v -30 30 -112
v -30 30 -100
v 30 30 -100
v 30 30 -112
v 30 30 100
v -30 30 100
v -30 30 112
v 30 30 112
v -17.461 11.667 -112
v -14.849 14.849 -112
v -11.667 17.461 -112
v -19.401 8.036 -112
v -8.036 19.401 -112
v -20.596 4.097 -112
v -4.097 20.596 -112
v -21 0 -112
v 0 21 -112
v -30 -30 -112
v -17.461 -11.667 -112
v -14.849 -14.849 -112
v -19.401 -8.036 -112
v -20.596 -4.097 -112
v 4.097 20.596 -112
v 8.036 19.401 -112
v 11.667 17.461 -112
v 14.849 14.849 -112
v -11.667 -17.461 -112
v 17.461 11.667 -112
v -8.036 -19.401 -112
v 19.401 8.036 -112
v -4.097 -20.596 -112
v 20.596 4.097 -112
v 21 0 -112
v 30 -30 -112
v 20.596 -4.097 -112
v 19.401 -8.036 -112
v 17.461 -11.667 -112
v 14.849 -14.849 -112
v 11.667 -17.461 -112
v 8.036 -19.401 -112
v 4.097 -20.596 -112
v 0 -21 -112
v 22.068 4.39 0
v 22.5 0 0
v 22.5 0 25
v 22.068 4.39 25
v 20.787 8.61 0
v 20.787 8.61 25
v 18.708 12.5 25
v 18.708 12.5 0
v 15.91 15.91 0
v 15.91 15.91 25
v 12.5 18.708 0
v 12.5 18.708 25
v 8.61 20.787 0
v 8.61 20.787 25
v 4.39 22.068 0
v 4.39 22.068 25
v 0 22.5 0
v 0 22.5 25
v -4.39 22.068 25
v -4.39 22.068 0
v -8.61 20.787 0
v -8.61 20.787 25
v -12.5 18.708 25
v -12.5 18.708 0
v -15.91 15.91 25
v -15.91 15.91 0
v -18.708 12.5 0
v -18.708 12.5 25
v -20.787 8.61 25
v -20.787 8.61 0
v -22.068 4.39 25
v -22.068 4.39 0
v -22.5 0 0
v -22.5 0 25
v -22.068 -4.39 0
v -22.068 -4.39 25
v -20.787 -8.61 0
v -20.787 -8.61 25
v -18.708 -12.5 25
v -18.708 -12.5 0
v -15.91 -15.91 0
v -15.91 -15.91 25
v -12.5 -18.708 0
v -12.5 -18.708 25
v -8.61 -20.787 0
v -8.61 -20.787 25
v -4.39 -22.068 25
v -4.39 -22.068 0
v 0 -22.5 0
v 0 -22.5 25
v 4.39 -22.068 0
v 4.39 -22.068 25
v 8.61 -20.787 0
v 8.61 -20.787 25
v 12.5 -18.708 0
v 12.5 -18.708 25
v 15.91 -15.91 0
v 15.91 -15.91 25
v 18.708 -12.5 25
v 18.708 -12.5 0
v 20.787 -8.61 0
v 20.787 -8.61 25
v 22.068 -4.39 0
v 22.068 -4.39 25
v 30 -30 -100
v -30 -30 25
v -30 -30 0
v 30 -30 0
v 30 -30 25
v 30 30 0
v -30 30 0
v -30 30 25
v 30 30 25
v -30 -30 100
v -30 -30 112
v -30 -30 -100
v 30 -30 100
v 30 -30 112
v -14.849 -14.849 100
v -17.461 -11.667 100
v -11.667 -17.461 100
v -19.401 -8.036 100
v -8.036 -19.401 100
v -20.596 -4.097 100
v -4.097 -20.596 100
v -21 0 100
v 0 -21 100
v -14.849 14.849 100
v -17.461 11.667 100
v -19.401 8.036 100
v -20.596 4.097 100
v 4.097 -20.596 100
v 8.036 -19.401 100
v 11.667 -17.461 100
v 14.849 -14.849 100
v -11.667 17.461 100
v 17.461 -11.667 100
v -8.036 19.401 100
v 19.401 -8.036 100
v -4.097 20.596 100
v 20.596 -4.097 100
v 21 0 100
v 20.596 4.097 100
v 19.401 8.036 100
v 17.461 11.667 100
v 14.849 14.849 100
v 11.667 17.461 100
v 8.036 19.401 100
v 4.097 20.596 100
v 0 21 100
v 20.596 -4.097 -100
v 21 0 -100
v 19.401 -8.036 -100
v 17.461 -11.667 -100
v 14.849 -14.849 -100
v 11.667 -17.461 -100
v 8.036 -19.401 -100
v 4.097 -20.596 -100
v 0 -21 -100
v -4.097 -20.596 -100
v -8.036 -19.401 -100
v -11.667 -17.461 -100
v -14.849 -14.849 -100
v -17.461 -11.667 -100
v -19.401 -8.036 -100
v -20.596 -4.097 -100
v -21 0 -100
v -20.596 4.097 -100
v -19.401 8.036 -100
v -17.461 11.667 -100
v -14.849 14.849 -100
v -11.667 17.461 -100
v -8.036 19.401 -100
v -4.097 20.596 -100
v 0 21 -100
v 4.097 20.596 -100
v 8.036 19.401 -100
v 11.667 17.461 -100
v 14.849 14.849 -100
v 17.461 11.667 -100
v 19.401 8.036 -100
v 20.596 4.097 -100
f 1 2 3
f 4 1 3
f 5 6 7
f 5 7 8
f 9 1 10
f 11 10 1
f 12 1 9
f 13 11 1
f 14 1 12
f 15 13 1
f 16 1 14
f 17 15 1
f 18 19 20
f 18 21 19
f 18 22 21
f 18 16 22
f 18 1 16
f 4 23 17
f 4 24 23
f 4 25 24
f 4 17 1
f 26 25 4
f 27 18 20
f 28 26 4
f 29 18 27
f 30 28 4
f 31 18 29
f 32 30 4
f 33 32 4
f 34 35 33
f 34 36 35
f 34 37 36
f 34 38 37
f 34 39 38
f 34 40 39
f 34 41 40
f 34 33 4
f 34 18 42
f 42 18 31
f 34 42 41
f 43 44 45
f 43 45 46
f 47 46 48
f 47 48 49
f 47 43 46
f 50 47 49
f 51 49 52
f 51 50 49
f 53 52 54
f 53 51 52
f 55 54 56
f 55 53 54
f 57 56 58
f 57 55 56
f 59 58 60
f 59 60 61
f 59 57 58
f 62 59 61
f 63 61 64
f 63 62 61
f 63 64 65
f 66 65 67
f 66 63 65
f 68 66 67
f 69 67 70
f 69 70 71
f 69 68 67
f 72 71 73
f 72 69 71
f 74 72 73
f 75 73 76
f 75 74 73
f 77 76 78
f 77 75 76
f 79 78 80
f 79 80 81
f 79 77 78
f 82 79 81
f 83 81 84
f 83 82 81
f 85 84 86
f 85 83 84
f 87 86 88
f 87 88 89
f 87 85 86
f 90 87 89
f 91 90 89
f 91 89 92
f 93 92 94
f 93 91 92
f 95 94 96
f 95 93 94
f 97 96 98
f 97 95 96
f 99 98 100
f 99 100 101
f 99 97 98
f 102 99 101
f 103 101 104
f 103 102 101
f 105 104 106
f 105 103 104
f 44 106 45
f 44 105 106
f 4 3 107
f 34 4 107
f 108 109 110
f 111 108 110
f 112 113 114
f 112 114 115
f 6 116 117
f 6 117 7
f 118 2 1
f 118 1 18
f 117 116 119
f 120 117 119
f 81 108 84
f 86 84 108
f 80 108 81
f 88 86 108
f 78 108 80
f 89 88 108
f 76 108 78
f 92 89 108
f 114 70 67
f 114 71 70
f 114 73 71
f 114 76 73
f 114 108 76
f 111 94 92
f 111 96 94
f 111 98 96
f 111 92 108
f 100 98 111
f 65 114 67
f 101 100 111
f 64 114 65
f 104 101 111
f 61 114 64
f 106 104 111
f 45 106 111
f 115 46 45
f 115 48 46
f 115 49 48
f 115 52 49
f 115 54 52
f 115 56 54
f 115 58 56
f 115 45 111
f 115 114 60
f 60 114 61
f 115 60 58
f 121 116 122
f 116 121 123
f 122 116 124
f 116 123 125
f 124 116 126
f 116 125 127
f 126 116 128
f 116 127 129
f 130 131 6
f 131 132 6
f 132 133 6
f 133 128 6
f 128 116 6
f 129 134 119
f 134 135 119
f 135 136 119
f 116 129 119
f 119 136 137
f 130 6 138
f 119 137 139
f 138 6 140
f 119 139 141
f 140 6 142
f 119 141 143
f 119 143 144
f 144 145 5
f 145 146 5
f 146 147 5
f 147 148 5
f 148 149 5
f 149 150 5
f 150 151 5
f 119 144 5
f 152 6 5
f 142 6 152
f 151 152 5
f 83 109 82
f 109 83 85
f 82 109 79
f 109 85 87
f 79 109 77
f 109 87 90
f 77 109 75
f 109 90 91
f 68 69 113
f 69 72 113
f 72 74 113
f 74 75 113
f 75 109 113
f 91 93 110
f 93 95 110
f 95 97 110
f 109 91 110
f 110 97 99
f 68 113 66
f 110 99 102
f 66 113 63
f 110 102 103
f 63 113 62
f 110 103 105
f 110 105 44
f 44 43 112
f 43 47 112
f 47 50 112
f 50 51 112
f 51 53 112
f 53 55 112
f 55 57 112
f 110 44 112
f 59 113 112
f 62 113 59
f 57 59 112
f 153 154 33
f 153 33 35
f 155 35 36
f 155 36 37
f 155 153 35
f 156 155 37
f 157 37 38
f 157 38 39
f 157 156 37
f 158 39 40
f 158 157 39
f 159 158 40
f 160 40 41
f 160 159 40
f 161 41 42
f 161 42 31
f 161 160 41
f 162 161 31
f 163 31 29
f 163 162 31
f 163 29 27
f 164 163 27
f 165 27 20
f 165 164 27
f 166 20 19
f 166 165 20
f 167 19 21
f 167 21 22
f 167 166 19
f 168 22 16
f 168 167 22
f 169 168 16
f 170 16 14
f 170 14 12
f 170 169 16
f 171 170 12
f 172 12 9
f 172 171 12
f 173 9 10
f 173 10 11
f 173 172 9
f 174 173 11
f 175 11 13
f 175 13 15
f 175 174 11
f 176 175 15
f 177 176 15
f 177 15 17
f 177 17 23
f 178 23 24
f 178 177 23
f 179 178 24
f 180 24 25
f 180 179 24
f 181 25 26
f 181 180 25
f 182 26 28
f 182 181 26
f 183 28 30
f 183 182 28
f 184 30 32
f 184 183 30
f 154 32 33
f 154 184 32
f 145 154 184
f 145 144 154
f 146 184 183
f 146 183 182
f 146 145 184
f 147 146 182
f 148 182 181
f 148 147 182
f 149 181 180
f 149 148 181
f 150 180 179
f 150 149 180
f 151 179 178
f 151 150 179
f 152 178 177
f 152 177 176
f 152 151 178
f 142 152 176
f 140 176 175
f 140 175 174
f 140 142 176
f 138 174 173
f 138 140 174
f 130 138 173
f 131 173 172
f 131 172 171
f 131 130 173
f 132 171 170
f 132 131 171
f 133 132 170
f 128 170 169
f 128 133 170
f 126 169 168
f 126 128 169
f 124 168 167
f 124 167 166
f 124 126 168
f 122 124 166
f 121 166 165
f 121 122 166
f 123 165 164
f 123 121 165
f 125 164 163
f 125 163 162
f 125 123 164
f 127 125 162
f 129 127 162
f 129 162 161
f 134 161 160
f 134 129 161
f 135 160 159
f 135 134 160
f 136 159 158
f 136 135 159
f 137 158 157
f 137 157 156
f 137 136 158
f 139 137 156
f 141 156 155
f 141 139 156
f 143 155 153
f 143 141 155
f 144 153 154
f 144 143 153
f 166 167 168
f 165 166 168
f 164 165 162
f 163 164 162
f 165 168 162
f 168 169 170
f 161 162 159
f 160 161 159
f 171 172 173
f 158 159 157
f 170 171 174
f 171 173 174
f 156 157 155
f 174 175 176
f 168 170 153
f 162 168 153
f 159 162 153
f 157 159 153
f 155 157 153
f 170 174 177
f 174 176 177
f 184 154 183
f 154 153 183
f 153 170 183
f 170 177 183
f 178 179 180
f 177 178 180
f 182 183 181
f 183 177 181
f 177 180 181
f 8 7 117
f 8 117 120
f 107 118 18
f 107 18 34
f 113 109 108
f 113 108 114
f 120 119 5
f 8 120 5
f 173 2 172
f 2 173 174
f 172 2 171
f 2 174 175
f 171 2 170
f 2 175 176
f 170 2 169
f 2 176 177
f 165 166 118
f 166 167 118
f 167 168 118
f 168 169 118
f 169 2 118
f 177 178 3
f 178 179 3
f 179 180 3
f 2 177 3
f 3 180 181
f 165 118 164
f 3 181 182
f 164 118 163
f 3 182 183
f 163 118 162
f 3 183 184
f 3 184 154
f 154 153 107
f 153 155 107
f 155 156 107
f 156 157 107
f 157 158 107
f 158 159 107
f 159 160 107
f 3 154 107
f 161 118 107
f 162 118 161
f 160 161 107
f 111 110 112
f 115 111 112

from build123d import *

# Parameters (mm, degrees)
F0_W      = 60
F0_H      = 60
F2_DEPTH  = 25
F1_R      = 22.5
F3_DEPTH  = 25
F4_R      = 21
F5_DEPTH  = 100
F6_W      = 60
F6_H      = 60
F7_DEPTH  = 12
F9_W      = 60
F9_H      = 60
F9_R      = 21
F10_DEPTH = 12


with BuildPart() as f2:
    # F0 (on Top) → F2 (new body)
    with BuildSketch(Plane.XY):
        Rectangle(F0_W, F0_H)
    extrude(amount=F2_DEPTH)

    # F1 (on Top) → F3 (cut)
    with BuildSketch(Plane.XY):
        Circle(F1_R)
    extrude(amount=F3_DEPTH, mode=Mode.SUBTRACT)


with BuildPart() as f5:
    # F4 (on Top) → F5 (new body, symmetric)
    with BuildSketch(Plane.XY):
        Circle(F4_R)
    extrude(amount=F5_DEPTH, both=True)

    # F6 (on face) → F7 (join)
    with BuildSketch(Plane.XY.offset(100)):
        Rectangle(F6_W, F6_H)
    extrude(amount=F7_DEPTH)


with BuildPart() as f10:
    # F9 (on face) → F10 (new body)
    with BuildSketch(Plane(origin=(0, 0, -100), x_dir=(1, 0, 0), z_dir=(0, 0, -1))):
        Rectangle(F9_W, F9_H)
        Circle(F9_R, mode=Mode.SUBTRACT)
    extrude(amount=F10_DEPTH)


solid = Compound([f2.part, f5.part, f10.part])
